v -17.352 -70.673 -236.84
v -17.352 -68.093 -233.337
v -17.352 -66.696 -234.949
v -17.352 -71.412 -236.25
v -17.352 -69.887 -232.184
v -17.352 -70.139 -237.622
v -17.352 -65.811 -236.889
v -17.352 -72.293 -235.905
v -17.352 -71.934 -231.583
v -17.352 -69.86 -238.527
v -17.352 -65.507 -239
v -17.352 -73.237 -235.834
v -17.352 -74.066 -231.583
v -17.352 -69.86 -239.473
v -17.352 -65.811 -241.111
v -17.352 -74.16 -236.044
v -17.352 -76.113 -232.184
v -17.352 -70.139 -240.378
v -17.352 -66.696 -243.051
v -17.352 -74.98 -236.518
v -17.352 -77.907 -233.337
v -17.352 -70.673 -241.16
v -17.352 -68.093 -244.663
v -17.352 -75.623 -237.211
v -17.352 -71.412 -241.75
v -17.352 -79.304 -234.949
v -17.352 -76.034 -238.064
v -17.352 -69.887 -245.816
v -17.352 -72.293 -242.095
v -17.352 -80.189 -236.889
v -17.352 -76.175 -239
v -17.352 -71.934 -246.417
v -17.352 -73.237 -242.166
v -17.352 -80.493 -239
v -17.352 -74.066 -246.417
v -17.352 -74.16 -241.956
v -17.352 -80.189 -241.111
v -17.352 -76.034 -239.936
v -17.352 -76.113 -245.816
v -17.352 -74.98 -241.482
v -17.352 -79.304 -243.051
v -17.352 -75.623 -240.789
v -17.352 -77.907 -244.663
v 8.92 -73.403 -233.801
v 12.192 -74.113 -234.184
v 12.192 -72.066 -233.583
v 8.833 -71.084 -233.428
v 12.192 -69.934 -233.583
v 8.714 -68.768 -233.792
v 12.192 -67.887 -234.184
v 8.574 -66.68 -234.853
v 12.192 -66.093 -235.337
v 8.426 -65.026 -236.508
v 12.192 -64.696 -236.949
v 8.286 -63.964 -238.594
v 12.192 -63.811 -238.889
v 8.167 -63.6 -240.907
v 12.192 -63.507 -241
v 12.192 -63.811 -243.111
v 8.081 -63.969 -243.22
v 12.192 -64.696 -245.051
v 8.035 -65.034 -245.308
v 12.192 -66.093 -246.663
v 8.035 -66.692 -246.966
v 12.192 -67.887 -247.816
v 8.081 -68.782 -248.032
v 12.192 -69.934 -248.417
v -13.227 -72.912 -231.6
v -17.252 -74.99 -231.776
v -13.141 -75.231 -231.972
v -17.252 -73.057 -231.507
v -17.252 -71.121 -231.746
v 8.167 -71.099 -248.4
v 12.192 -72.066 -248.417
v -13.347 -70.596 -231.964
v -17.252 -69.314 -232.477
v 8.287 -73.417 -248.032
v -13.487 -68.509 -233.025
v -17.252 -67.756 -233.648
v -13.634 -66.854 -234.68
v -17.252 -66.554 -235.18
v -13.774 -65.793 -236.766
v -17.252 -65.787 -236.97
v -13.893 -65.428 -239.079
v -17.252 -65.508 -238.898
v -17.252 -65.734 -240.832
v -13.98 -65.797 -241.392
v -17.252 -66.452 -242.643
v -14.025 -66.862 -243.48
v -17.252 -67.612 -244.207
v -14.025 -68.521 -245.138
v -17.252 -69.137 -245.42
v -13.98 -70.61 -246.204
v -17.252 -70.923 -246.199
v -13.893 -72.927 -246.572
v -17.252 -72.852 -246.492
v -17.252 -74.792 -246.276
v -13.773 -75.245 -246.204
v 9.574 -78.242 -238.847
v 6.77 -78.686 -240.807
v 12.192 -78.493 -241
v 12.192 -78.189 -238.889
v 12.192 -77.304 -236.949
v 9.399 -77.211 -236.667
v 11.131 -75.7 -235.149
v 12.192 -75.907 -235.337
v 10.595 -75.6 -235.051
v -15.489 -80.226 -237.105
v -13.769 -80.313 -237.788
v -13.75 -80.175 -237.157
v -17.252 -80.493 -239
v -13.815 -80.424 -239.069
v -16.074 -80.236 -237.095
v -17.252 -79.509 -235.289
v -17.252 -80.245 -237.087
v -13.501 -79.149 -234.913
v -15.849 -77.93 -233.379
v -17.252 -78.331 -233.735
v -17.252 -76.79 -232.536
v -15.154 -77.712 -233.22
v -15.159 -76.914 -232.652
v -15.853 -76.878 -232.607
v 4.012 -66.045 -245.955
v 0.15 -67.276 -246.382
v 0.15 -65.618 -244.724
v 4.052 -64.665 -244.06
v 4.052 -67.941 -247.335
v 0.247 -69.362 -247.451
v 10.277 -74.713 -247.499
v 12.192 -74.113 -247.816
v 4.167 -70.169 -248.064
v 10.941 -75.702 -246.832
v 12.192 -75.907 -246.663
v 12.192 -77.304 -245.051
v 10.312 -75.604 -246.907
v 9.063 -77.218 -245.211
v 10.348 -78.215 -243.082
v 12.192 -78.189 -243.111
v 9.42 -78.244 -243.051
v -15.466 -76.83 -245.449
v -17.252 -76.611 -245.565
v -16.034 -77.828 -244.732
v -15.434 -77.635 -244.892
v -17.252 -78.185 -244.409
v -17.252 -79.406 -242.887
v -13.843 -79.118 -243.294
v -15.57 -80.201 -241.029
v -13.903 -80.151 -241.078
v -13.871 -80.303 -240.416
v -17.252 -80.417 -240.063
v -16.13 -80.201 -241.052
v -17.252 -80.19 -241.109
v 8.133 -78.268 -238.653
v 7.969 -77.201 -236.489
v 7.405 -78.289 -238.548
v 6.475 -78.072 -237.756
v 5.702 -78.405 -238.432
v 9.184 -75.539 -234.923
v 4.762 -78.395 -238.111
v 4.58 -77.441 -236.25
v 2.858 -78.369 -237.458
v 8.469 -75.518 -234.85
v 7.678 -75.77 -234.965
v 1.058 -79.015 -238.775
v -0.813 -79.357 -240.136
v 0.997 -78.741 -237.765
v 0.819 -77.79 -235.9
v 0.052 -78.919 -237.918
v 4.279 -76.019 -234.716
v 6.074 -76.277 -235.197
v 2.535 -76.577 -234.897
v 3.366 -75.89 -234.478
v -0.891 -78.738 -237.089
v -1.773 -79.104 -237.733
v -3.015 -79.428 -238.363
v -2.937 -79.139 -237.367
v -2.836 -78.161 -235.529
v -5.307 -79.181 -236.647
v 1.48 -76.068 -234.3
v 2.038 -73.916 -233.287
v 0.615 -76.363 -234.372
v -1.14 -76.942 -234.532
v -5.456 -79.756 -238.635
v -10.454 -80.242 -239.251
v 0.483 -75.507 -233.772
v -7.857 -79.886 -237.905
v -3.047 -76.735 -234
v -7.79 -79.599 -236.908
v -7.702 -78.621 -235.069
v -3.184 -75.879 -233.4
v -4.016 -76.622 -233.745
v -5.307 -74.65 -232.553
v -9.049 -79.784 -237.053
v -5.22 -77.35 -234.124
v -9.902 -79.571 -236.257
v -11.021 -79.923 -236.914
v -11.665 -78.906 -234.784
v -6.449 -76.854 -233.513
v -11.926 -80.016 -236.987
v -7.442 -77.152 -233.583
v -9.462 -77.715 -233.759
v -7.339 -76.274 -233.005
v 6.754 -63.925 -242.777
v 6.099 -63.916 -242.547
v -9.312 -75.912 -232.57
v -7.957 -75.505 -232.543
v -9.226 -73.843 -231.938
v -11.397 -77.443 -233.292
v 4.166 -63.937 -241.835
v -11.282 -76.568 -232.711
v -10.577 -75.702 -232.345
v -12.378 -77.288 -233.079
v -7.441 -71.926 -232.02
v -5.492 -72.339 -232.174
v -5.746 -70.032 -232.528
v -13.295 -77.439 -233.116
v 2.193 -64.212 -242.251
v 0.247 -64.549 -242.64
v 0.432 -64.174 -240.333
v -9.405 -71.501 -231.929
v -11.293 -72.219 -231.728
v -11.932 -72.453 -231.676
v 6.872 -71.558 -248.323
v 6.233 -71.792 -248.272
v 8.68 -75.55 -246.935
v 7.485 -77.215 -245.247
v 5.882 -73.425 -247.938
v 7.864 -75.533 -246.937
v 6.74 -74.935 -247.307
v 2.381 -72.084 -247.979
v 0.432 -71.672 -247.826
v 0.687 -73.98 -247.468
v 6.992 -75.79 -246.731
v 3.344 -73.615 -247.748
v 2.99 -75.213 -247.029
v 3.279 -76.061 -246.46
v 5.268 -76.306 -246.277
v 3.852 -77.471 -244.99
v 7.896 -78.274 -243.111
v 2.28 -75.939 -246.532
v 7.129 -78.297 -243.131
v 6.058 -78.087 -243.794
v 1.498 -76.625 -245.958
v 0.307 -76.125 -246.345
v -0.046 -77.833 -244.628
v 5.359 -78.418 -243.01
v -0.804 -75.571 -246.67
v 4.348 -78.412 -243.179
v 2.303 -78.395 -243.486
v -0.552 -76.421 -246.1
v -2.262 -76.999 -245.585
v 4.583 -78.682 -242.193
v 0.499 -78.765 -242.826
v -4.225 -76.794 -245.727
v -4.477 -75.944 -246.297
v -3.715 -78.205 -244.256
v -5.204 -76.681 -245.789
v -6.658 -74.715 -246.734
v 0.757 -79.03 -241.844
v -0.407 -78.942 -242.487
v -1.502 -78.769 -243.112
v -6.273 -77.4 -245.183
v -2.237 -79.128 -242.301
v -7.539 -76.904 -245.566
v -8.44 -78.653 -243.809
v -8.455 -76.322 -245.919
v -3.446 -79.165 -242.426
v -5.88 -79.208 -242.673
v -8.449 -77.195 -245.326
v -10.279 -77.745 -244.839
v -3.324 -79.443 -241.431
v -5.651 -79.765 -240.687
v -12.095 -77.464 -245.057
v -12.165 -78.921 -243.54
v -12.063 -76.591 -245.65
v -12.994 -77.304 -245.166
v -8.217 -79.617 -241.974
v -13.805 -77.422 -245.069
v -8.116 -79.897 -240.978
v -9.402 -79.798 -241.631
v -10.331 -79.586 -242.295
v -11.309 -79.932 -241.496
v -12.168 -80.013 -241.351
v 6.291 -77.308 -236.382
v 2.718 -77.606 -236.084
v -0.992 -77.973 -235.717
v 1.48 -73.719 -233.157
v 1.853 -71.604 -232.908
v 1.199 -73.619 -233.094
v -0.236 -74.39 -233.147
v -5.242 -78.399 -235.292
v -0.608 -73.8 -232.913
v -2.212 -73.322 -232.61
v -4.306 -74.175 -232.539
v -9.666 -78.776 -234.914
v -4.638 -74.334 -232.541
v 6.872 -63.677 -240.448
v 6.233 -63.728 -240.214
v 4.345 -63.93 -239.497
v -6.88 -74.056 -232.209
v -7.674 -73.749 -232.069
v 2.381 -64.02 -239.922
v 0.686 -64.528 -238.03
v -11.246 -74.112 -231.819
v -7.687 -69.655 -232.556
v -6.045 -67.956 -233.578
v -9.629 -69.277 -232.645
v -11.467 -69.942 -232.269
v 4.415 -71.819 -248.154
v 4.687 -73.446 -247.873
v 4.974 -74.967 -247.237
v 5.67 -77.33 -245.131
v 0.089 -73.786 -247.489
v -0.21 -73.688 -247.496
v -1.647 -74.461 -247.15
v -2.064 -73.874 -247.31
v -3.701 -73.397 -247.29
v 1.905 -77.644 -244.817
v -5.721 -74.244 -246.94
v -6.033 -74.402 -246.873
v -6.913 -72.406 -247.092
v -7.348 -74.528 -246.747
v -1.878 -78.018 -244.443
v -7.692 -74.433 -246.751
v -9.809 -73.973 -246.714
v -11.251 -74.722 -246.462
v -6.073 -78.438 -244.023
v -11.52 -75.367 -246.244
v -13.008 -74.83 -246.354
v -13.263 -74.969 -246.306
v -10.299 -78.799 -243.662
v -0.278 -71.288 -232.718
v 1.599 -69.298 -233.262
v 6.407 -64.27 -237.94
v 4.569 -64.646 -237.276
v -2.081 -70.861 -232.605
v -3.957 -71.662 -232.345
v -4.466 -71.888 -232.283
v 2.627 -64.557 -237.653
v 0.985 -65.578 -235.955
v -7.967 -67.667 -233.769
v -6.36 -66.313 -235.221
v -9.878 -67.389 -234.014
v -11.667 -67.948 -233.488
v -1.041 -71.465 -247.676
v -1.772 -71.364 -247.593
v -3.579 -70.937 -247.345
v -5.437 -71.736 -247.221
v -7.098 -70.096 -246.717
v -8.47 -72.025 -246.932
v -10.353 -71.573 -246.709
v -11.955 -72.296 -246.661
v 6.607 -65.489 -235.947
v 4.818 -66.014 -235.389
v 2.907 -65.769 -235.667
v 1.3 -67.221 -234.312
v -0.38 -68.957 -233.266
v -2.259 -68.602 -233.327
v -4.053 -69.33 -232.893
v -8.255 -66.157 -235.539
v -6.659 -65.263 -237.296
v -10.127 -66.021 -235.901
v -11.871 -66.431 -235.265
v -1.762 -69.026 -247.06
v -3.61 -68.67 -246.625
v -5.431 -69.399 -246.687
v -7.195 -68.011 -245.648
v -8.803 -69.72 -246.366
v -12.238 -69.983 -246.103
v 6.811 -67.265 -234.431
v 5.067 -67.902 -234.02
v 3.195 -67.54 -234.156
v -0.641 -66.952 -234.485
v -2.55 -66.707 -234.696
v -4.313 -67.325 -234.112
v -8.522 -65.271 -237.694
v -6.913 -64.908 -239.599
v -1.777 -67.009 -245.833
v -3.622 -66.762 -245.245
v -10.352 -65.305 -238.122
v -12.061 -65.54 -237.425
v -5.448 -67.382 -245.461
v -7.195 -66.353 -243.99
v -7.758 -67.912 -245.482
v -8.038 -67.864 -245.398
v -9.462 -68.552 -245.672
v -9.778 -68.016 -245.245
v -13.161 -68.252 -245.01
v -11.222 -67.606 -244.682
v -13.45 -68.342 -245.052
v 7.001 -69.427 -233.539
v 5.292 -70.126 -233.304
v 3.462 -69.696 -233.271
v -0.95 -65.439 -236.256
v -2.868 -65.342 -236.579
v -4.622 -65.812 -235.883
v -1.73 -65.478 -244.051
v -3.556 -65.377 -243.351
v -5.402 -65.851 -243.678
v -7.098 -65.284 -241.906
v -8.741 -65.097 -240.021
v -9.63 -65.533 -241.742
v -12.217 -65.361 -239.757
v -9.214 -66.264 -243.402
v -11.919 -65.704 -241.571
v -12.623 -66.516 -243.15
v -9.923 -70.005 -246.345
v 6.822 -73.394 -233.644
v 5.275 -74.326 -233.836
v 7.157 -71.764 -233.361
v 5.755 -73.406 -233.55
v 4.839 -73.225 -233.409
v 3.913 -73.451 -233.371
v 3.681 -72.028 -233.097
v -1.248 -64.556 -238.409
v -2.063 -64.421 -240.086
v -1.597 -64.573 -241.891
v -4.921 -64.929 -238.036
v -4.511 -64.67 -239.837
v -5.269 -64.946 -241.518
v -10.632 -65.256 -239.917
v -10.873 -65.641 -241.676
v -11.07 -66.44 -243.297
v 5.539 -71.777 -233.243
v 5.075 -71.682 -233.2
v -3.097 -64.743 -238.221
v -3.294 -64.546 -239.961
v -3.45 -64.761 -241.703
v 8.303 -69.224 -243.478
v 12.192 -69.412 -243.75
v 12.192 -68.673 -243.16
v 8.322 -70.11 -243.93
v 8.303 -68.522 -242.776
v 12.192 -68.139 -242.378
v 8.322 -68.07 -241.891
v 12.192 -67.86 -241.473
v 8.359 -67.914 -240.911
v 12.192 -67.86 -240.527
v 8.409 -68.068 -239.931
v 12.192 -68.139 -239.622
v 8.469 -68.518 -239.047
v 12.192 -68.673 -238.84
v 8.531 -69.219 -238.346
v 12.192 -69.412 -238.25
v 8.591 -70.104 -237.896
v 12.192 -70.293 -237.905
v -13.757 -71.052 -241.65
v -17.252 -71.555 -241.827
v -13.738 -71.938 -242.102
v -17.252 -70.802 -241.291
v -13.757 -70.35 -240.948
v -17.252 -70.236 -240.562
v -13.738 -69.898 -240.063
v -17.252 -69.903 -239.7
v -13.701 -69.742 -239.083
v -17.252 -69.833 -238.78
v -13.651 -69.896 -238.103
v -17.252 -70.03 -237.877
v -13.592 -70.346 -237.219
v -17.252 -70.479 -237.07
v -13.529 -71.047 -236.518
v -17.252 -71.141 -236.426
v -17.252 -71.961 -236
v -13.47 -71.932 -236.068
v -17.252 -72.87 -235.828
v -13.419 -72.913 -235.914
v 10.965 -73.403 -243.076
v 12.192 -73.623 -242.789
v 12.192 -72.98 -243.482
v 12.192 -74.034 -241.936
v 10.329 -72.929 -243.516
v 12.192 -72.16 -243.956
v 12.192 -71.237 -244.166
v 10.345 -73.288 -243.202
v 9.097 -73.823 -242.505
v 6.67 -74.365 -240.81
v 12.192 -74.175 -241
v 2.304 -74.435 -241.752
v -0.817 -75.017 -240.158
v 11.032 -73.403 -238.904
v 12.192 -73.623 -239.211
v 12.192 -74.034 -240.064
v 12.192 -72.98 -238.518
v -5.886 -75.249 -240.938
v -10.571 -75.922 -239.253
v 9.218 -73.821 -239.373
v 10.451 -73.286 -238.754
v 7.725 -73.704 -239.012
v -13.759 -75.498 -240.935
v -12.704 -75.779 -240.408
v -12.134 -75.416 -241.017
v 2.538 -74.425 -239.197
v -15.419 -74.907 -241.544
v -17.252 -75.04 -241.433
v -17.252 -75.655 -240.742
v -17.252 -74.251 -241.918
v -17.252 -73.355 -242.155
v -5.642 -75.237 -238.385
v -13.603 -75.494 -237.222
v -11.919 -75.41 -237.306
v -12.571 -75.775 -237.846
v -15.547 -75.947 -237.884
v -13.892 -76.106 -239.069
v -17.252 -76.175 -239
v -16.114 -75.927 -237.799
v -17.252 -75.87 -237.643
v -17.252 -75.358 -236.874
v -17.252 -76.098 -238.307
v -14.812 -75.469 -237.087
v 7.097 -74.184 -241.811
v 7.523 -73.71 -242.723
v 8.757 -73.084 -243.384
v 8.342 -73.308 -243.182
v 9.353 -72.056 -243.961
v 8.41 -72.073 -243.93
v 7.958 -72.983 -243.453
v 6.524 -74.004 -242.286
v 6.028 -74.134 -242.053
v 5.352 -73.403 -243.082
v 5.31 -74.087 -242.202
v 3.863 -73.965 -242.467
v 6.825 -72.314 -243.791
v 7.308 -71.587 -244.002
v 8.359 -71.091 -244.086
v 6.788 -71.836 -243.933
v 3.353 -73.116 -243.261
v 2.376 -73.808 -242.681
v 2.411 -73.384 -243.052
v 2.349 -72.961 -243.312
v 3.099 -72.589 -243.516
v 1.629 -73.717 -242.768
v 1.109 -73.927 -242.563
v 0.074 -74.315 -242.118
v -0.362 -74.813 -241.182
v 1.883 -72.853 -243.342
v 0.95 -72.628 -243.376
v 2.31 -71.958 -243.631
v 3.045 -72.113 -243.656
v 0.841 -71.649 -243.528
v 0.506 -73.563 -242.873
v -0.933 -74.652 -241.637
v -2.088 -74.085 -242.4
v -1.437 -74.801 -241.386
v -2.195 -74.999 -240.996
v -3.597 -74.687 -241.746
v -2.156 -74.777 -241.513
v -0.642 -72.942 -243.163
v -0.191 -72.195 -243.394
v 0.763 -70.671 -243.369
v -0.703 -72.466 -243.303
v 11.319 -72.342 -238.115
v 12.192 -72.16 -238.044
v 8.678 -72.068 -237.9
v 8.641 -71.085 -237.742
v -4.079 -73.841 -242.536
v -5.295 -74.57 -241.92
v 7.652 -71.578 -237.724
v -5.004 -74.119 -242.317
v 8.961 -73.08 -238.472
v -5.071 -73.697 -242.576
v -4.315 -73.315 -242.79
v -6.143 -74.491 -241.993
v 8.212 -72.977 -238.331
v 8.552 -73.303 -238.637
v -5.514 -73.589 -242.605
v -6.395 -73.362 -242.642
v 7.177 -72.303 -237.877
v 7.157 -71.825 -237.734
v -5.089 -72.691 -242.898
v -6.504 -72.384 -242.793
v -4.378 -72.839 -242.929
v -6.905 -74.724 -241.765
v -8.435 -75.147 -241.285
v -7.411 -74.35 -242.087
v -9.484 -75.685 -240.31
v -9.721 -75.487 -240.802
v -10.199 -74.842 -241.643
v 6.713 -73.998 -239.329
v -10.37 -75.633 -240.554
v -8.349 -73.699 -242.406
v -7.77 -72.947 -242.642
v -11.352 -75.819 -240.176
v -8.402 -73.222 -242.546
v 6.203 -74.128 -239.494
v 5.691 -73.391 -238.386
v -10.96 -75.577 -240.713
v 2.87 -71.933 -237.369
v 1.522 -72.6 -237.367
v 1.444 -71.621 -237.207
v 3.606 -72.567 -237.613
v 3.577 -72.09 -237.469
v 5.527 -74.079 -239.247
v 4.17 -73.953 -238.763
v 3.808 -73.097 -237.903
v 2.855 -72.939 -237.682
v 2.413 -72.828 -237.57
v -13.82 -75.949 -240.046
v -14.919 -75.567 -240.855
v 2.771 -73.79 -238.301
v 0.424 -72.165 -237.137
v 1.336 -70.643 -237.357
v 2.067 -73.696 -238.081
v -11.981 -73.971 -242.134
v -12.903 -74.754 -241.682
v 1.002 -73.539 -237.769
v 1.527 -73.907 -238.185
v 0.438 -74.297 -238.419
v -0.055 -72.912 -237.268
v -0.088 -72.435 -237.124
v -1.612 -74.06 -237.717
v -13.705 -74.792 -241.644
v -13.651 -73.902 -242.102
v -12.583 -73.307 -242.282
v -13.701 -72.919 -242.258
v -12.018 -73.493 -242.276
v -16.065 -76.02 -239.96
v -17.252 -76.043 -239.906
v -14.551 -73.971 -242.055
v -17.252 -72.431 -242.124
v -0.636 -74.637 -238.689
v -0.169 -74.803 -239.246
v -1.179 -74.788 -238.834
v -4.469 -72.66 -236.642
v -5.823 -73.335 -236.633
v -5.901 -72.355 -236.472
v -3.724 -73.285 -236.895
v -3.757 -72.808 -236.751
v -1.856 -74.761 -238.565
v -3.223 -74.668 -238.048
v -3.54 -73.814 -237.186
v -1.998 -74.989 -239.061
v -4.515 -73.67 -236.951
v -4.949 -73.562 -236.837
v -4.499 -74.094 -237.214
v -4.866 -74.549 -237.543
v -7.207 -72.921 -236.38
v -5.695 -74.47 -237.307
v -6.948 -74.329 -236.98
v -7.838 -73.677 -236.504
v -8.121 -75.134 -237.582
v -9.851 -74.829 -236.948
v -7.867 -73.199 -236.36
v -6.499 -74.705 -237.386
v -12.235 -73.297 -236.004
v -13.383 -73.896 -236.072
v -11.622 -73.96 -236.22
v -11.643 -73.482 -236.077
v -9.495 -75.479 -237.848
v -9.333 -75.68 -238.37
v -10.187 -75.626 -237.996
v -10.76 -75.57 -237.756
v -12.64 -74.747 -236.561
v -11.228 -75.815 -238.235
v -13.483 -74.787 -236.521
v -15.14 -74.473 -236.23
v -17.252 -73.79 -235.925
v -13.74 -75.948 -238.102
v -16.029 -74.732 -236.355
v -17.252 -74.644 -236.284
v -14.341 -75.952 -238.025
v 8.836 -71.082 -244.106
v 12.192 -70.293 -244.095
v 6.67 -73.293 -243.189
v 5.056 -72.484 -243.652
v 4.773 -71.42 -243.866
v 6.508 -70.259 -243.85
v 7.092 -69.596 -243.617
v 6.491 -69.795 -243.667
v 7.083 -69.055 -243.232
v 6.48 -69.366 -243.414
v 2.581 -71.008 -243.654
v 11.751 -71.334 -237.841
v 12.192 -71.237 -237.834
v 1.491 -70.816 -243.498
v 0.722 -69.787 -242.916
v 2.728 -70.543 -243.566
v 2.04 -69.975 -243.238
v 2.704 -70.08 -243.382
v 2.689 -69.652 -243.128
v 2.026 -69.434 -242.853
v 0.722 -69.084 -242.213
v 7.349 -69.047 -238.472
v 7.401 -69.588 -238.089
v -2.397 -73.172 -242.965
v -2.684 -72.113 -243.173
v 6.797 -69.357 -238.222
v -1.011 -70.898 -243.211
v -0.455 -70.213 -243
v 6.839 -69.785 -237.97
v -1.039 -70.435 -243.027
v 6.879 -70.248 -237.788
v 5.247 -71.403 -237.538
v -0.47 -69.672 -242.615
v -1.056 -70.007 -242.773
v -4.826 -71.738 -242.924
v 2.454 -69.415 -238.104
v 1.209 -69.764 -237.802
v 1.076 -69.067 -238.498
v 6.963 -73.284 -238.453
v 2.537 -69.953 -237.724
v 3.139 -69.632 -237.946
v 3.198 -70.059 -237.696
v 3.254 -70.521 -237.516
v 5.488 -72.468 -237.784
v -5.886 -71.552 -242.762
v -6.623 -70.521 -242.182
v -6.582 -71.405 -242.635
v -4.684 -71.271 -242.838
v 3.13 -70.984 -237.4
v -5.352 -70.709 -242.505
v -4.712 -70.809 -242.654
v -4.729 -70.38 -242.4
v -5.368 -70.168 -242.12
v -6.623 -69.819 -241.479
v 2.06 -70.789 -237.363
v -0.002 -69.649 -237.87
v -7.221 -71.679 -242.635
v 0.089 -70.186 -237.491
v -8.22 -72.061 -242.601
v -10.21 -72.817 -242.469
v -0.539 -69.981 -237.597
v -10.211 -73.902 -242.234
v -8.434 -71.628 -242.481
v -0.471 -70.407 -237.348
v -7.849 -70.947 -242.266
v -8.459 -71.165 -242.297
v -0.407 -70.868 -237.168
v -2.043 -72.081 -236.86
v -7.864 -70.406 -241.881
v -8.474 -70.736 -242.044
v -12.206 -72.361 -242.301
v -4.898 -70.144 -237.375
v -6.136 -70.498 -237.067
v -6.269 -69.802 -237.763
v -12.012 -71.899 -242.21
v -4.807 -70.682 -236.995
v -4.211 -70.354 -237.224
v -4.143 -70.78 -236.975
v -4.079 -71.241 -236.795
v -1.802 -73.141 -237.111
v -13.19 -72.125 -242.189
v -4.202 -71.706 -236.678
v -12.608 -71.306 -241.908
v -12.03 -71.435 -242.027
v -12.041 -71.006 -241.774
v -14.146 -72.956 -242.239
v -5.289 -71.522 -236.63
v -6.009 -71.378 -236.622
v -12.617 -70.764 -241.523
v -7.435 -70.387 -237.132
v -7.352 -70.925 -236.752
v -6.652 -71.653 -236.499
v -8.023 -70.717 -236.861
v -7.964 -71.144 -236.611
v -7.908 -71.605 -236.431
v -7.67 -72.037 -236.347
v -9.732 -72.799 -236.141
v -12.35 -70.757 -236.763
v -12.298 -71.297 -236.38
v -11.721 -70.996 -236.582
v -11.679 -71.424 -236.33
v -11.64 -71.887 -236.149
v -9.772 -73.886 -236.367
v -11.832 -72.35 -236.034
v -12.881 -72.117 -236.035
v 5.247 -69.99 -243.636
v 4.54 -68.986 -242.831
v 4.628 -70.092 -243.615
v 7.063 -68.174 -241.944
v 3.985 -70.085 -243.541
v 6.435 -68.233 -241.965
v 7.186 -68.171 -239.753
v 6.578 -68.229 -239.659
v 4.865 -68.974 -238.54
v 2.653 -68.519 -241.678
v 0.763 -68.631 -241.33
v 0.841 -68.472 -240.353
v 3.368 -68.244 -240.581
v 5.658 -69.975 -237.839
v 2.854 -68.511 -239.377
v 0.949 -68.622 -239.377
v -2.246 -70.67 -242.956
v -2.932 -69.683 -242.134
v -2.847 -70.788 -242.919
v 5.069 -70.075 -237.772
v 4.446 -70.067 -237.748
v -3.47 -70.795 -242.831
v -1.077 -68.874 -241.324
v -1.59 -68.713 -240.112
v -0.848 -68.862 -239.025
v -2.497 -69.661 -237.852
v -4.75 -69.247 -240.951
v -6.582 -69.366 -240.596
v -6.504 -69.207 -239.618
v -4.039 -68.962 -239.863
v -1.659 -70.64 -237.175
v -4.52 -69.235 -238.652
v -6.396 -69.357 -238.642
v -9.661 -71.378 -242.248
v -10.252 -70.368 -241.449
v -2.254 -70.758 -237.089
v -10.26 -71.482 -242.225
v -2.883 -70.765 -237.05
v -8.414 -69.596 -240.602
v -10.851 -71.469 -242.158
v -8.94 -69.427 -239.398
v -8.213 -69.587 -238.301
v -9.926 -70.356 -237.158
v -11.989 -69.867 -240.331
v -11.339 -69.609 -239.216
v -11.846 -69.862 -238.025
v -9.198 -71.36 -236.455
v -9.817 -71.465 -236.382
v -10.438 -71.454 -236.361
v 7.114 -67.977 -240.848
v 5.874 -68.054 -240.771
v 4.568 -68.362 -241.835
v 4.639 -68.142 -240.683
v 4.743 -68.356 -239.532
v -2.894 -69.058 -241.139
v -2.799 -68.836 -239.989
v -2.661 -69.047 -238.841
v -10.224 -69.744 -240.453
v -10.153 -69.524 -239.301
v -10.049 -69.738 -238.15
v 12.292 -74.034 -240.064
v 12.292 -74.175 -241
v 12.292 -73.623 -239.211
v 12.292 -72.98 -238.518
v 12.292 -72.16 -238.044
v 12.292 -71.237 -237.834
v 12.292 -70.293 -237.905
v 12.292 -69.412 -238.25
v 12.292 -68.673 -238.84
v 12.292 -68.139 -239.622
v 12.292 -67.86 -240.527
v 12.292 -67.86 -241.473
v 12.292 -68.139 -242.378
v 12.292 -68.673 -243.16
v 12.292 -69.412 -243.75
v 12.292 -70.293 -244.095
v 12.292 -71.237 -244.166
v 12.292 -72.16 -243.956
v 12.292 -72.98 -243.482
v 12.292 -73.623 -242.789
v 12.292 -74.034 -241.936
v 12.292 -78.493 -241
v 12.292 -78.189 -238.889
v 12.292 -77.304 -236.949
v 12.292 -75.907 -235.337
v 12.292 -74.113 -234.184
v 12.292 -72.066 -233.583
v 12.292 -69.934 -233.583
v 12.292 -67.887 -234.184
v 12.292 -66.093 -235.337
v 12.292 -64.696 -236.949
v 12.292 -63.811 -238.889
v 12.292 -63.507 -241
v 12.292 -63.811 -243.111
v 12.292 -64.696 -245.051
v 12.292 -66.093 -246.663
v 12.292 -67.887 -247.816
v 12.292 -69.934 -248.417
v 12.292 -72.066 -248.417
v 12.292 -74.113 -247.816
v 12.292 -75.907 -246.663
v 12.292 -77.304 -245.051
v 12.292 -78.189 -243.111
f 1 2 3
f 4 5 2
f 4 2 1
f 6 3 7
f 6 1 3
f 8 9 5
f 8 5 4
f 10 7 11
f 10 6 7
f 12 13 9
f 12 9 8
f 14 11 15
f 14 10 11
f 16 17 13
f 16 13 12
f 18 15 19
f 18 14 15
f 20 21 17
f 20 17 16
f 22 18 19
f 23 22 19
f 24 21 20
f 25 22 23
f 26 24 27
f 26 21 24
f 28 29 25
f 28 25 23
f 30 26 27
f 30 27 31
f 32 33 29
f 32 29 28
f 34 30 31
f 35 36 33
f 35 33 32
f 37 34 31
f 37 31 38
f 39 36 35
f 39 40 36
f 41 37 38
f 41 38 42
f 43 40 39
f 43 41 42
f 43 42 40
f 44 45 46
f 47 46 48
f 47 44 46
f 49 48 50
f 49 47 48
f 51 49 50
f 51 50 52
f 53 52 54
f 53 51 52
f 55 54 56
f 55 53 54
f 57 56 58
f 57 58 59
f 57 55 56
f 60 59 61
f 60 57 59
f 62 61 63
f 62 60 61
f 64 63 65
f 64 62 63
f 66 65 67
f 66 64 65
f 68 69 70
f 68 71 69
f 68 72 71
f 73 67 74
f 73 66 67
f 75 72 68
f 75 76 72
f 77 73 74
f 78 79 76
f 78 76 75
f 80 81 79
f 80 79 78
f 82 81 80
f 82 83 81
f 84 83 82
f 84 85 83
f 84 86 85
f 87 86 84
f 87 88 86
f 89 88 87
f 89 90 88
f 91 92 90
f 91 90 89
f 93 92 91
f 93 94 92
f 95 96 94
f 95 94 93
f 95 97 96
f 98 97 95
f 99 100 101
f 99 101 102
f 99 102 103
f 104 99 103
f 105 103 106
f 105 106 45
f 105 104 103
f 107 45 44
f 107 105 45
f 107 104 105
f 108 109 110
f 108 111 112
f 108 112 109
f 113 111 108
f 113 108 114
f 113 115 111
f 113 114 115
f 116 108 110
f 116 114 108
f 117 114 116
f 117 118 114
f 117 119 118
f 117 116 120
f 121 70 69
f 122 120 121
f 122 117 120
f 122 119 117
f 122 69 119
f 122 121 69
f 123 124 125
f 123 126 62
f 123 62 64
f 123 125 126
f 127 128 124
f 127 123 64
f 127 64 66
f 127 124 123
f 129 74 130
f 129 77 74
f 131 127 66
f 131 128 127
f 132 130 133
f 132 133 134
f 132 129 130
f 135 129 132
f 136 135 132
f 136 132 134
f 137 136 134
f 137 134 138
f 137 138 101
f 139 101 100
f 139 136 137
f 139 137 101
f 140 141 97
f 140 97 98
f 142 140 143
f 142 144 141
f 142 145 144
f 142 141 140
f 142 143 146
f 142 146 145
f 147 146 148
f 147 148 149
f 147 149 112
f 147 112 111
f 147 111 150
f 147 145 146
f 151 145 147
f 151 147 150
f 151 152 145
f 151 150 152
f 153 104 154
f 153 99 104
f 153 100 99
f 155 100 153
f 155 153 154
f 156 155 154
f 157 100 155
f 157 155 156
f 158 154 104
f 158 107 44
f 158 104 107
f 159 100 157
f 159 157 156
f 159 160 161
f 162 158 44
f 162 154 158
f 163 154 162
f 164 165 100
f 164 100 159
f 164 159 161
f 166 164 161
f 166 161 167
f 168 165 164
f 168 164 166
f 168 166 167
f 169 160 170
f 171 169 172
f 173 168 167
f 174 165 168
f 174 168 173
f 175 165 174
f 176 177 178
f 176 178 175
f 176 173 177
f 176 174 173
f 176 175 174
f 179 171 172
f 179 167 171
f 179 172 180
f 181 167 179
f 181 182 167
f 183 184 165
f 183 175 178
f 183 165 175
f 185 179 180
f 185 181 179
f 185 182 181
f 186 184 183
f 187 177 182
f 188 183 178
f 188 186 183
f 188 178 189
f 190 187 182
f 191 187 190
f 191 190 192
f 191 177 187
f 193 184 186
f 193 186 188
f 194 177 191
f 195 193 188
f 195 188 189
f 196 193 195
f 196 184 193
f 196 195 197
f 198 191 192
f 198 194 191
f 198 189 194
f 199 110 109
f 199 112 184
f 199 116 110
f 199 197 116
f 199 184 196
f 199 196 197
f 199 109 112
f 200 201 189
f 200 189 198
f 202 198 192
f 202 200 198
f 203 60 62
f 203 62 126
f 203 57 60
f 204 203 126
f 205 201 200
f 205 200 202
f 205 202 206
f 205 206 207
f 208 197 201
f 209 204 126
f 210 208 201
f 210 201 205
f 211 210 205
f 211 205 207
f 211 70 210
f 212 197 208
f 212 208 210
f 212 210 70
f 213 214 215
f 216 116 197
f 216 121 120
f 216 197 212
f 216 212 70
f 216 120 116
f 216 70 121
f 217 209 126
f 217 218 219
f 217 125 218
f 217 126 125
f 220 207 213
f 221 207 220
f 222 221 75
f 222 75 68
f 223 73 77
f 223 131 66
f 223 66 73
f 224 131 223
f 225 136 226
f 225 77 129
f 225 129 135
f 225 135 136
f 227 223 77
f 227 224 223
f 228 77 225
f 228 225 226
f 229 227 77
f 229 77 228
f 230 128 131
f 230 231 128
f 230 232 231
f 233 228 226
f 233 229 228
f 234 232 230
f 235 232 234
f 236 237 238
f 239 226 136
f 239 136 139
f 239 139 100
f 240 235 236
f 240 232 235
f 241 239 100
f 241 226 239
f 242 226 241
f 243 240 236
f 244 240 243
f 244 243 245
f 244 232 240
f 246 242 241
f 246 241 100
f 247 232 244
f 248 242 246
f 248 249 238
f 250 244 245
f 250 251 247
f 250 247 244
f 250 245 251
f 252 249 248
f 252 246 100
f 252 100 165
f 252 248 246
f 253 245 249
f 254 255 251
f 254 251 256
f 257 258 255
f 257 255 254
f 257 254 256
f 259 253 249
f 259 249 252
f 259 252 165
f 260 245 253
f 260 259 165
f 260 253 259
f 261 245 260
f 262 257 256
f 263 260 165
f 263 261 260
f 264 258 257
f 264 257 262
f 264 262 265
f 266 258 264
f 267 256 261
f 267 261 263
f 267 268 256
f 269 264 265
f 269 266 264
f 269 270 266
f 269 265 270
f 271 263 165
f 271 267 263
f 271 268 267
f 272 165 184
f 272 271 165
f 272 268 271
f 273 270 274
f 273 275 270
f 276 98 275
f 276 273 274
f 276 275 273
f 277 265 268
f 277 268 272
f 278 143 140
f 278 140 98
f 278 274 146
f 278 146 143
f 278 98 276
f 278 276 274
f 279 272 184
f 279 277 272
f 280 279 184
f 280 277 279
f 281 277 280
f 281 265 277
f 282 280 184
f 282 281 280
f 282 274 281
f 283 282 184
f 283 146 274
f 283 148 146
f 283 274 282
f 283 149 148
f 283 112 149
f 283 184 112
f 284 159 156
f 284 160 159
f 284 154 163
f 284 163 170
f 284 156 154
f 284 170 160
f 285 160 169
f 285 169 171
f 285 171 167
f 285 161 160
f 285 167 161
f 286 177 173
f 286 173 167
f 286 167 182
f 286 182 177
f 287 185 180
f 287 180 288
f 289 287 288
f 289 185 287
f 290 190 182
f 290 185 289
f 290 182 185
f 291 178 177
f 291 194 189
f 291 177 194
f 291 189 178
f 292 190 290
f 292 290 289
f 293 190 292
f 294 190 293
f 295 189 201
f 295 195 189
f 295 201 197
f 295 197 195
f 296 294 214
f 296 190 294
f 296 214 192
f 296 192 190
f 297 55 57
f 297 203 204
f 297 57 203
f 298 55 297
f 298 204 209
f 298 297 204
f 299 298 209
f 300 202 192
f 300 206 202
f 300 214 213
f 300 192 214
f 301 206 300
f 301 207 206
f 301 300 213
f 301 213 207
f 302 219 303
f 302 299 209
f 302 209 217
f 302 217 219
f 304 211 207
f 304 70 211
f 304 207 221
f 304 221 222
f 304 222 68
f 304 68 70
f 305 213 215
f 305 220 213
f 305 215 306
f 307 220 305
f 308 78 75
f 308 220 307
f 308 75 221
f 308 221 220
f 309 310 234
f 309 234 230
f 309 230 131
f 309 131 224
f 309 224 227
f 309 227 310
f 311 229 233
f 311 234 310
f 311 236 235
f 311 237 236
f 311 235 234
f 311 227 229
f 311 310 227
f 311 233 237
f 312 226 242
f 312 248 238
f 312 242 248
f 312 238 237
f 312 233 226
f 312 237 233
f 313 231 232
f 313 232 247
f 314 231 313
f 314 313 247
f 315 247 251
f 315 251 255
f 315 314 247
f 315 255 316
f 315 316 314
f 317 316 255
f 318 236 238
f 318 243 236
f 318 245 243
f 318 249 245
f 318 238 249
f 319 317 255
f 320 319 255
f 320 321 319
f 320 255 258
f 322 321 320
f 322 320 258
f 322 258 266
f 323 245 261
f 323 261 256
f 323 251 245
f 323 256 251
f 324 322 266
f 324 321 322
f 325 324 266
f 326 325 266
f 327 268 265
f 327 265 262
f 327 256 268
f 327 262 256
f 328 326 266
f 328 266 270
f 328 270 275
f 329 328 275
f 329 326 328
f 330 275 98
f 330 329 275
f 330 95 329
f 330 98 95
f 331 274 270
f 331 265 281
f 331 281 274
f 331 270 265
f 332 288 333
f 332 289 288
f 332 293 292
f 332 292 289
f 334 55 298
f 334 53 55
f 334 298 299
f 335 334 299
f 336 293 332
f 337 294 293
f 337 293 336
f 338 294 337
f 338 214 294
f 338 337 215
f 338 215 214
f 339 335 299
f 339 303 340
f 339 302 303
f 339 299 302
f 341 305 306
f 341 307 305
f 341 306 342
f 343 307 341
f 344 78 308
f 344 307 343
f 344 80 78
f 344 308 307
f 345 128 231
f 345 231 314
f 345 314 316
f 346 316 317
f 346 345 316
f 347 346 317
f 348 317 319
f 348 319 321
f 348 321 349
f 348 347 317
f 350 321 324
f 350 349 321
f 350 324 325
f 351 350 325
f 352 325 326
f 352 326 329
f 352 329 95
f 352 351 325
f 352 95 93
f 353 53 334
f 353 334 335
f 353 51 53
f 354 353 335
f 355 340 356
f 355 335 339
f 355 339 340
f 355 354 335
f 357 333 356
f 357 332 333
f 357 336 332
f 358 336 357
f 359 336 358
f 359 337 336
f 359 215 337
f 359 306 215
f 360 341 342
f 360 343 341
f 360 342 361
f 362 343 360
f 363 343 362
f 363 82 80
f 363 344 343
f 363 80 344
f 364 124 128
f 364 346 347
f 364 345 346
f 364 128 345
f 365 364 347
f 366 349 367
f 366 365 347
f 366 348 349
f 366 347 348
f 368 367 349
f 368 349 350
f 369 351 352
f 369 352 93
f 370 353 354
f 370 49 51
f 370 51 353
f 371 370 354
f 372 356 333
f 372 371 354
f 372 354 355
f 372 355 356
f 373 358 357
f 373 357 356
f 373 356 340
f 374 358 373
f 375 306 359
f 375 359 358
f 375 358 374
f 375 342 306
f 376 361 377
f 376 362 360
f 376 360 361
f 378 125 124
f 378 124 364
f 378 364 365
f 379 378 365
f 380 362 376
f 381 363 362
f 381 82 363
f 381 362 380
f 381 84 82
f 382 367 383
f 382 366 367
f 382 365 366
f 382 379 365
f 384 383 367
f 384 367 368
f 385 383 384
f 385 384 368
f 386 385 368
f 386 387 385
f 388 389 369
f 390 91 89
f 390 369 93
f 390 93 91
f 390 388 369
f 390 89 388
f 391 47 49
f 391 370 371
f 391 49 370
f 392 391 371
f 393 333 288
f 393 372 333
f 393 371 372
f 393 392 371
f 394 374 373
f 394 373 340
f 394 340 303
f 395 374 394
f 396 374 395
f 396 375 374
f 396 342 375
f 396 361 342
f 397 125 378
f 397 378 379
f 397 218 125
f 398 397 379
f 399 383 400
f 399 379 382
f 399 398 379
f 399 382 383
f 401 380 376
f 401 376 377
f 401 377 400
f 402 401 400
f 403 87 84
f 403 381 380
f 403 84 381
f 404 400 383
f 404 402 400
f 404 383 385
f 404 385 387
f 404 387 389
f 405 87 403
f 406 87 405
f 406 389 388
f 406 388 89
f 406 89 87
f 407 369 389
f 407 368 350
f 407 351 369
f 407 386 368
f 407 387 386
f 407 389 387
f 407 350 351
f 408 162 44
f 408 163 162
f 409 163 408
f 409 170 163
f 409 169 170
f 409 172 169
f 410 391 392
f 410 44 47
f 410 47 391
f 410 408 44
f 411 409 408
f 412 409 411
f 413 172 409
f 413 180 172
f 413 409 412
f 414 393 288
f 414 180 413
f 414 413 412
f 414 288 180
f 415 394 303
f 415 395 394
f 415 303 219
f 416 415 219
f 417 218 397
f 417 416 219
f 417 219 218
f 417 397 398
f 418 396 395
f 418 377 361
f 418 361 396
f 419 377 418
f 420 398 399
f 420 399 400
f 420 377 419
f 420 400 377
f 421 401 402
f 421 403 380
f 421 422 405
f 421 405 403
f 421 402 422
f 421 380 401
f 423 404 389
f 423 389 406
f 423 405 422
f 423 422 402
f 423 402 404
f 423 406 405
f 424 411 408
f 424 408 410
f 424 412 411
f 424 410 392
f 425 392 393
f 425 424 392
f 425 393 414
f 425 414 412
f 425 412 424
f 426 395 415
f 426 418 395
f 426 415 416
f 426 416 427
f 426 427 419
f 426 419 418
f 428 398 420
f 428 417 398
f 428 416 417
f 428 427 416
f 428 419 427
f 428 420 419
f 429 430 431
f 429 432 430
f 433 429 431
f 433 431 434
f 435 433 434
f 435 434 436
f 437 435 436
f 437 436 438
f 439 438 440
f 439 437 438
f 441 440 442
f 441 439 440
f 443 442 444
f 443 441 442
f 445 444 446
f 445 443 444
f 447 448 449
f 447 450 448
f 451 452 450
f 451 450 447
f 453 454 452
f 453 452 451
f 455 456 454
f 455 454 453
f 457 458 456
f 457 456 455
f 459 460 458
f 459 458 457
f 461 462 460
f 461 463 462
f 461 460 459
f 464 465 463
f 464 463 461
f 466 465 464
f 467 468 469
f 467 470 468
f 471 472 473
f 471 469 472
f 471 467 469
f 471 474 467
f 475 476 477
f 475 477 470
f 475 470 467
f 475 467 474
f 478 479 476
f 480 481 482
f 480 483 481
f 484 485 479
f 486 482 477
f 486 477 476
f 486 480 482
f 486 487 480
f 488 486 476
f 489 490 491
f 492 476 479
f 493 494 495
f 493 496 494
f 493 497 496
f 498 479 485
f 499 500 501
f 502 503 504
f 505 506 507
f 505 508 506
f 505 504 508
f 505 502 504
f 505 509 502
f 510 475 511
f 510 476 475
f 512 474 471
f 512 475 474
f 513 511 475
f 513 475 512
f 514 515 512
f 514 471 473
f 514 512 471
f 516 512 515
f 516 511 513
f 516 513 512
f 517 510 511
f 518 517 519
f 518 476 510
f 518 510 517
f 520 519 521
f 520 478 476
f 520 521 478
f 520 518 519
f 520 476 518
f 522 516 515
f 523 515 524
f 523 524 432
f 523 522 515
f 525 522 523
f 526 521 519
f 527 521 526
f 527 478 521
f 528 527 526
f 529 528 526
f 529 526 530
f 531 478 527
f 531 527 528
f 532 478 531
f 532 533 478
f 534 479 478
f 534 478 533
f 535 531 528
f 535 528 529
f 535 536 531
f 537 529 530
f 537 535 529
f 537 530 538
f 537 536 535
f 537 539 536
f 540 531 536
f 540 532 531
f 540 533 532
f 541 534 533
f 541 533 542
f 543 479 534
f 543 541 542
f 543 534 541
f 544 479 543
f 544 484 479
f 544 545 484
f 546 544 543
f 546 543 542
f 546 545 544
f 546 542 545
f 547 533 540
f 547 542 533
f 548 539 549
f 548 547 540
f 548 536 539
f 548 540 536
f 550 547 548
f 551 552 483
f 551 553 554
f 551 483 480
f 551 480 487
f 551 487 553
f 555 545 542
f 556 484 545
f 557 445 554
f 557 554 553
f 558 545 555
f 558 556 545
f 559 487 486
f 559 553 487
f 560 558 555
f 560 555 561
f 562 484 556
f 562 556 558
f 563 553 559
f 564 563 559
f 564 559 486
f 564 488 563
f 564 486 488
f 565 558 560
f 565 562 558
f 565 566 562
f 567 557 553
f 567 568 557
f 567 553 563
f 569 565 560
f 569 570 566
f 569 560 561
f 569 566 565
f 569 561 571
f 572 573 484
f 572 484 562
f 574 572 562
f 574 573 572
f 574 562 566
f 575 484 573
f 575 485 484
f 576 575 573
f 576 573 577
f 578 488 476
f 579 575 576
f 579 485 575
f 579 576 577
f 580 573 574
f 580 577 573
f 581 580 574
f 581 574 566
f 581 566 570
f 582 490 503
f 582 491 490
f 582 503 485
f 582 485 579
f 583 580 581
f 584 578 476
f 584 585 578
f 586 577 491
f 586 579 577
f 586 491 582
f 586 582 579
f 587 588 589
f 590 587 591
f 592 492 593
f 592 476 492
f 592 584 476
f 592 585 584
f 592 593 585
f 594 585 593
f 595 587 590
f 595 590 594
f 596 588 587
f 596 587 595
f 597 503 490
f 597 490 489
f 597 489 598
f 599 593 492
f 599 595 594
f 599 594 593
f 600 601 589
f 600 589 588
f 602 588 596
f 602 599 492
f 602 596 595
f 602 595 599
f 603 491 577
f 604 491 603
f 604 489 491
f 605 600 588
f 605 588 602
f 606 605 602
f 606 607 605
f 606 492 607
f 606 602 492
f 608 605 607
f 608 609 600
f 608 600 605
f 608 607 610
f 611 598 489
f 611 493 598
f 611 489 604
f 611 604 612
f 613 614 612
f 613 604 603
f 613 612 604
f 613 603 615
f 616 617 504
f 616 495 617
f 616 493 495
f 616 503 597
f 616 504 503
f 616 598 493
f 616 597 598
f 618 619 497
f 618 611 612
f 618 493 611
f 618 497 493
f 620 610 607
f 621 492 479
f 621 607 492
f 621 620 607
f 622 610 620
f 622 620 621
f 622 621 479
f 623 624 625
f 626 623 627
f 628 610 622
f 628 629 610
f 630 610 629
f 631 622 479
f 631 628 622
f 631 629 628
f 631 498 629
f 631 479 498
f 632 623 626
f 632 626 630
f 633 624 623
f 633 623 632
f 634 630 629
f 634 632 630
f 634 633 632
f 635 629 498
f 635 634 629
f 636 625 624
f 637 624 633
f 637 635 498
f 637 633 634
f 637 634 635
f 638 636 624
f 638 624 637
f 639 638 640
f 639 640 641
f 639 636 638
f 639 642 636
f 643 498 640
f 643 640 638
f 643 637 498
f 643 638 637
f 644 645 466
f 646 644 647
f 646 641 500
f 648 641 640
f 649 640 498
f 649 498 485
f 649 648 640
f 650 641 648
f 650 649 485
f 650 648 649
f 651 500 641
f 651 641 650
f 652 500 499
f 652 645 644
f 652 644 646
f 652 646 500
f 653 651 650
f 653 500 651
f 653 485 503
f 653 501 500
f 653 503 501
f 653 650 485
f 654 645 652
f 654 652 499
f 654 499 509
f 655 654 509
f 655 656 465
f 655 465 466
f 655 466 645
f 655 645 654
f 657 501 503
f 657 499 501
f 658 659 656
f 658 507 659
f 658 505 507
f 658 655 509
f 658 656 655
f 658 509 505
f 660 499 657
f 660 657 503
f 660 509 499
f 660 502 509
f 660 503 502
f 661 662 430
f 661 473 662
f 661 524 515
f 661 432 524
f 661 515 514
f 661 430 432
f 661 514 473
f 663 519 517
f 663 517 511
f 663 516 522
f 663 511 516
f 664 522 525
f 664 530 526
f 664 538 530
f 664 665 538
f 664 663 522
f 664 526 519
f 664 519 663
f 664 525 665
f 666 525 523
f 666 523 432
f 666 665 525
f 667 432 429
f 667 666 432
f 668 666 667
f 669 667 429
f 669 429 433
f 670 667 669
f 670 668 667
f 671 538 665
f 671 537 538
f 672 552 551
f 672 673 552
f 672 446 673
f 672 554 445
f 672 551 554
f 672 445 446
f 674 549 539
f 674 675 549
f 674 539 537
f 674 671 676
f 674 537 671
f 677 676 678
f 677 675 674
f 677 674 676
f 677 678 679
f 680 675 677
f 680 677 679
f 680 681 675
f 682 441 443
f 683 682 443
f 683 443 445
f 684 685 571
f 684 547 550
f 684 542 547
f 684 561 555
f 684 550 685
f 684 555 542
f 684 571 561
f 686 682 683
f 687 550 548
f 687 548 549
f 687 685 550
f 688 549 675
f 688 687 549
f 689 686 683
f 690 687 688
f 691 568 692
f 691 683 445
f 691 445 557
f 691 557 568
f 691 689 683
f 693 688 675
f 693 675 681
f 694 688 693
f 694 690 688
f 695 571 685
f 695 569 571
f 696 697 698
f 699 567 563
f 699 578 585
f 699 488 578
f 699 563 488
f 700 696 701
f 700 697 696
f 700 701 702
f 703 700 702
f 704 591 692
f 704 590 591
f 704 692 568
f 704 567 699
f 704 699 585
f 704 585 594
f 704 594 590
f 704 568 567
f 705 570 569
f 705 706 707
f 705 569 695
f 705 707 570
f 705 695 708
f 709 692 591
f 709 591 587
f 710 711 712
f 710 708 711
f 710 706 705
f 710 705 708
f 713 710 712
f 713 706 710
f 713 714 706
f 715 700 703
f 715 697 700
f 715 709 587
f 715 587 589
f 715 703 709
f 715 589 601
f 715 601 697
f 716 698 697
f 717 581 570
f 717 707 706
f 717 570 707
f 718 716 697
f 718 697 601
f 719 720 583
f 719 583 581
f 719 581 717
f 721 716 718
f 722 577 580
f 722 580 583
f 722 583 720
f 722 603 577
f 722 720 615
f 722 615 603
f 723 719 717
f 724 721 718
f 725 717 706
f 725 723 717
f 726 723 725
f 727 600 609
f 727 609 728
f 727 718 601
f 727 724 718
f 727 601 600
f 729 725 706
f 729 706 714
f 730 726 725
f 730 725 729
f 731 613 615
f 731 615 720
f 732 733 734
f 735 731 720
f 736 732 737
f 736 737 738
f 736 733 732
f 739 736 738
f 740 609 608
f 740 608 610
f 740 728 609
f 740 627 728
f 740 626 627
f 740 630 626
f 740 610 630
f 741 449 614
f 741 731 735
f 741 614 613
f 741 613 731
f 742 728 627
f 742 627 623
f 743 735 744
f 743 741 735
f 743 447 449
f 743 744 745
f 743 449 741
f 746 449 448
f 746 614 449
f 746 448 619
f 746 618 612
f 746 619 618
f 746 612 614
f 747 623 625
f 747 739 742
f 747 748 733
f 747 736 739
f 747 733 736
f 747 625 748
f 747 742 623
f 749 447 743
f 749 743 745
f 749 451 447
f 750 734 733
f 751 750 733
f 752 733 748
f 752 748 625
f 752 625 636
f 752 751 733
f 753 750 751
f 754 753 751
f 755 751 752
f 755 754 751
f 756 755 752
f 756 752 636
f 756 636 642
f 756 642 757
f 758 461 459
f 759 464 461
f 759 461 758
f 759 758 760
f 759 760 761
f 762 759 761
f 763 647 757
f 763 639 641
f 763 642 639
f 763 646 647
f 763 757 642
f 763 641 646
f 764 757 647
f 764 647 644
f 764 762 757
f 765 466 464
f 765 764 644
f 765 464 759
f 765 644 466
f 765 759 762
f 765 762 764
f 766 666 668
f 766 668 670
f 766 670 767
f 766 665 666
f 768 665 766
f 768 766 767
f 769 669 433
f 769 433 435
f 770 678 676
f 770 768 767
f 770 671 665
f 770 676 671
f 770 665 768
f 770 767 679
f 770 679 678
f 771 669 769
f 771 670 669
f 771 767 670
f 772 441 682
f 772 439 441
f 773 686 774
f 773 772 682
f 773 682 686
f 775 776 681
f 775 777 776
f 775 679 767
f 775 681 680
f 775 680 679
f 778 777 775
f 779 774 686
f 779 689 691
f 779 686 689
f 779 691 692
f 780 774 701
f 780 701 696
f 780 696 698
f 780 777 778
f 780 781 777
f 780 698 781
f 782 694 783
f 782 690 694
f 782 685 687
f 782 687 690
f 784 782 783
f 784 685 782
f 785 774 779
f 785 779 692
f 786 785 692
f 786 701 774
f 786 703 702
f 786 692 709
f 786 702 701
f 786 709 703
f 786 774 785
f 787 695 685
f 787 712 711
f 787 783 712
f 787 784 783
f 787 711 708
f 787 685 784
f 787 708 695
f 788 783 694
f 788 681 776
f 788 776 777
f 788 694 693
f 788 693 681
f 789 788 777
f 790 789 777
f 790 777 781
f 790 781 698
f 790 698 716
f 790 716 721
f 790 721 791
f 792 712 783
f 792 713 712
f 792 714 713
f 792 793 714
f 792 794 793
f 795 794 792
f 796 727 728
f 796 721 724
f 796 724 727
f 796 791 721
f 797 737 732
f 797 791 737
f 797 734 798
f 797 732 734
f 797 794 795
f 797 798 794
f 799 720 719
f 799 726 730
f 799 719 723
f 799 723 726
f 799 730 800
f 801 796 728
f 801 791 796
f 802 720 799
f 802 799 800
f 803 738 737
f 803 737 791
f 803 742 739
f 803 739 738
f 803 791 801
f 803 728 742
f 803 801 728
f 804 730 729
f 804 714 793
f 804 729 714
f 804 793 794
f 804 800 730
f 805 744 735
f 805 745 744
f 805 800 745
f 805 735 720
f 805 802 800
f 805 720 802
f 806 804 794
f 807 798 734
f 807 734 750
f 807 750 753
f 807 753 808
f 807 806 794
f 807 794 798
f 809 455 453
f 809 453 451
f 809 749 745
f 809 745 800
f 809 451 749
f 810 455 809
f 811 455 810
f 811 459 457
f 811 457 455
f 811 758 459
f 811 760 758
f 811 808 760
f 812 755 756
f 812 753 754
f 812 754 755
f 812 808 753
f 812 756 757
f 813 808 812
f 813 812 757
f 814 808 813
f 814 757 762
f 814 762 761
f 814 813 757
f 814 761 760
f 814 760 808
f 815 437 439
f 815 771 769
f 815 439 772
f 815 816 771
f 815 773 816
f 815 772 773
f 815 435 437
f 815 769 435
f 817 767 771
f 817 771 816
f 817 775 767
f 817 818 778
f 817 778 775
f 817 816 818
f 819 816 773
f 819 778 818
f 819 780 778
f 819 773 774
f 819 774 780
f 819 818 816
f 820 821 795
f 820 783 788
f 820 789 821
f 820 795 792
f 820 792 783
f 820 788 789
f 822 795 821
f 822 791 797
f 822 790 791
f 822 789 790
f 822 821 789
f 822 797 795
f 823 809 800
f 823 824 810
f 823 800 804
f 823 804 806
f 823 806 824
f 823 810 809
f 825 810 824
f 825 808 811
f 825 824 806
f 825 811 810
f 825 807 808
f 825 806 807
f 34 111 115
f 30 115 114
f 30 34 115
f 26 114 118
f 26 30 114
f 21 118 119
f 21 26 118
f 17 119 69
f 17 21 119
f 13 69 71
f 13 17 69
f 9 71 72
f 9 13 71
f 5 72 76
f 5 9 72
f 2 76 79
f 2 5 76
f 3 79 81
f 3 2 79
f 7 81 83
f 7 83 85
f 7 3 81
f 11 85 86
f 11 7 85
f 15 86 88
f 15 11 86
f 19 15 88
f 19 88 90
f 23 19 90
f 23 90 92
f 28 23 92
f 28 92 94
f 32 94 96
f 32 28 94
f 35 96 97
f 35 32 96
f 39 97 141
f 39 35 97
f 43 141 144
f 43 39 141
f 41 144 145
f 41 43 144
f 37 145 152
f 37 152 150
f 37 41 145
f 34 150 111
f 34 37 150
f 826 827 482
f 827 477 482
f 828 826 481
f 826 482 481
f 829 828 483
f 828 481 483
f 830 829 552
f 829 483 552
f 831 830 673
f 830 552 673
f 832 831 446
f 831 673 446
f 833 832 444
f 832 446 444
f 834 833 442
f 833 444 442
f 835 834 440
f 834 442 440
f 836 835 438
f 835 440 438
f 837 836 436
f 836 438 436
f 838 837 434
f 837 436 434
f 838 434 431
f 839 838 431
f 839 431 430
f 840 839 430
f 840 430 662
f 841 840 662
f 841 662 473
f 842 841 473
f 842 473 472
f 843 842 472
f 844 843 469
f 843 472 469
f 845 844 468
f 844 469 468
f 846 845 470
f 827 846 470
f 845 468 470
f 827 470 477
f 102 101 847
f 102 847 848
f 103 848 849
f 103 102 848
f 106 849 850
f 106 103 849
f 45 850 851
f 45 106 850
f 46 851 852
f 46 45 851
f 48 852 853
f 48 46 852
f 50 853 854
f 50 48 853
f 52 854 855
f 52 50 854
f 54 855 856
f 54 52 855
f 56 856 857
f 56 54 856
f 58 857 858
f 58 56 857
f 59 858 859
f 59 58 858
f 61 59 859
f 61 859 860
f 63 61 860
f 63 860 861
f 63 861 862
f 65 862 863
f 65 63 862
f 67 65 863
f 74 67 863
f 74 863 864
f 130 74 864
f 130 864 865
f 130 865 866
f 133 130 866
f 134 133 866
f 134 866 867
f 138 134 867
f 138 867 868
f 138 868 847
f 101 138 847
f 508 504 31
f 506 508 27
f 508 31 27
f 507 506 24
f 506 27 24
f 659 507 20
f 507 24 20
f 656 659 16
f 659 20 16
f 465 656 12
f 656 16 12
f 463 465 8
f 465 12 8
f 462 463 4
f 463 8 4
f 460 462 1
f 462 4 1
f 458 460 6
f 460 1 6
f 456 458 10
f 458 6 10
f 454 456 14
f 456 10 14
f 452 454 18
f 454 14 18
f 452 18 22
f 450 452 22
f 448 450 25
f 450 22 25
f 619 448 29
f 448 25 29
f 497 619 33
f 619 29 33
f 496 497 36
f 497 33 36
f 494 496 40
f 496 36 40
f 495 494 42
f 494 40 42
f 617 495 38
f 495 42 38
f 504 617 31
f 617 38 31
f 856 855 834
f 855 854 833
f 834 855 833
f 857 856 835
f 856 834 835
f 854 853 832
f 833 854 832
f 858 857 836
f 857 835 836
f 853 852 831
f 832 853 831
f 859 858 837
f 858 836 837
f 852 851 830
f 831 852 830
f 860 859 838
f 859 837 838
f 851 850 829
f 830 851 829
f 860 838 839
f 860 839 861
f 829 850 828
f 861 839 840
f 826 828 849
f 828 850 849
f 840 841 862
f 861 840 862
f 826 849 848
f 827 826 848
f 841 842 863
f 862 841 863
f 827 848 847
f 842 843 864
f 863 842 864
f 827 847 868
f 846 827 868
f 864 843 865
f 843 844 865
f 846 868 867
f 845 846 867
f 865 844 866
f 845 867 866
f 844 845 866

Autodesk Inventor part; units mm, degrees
ref_plane "YZ Plane" through (0, 0, 0) normal (1, 0, 0) x (0, 1, 0)
ref_plane "XZ Plane" through (0, 0, 0) normal (0, 1, 0) x (-1, 0, 0)
ref_plane "XY Plane" through (0, 0, 0) normal (0, 0, 1) x (1, 0, 0)
ref_plane "Plano de trabajo1" through (12.1916, -71, -241) normal (-1, 0, 0) x (0, -1, 0)
sketch "Boceto2" plane through (12.1916, -71, -241) normal (-1, 0, 0) x (0, -1, 0)
  circle A0 centre (0, 0) radius 7.493
  circle A1 centre (0, 0) radius 3.175
sketch3d "Boceto 3D1"
  line L0 (12.2916, -71, -241) -> (12.1916, -71, -241)
  spline S0 degree 3 poles (12.1916, -71, -241) (2.3319, -71, -241) (-7.3922, -73, -239) (-17.2519, -73, -239) knots 0 0 0 0 2.957898 2.957898 2.957898 2.957898
  line L1 (-17.2519, -73, -239) -> (-17.3519, -73, -239)
  dimension "d4" = 1
  dimension "d5" = 1
sweep "Barrido1" add profiles "Boceto2" path "Boceto 3D1"
equation "\"ID\" = 6.35"
equation "\"OD\" = 14.986"
equation "\"L\" = PL"
equation "\"PL\" = 29.6164"
equation "\"Size_Designation\" = 0.25"
equation "\"RPL\" = 29.9974"
equation "\"OPL\" = 29.6164"
equation "\"ROPL\" = 29.9974"
properties material "Caucho"
